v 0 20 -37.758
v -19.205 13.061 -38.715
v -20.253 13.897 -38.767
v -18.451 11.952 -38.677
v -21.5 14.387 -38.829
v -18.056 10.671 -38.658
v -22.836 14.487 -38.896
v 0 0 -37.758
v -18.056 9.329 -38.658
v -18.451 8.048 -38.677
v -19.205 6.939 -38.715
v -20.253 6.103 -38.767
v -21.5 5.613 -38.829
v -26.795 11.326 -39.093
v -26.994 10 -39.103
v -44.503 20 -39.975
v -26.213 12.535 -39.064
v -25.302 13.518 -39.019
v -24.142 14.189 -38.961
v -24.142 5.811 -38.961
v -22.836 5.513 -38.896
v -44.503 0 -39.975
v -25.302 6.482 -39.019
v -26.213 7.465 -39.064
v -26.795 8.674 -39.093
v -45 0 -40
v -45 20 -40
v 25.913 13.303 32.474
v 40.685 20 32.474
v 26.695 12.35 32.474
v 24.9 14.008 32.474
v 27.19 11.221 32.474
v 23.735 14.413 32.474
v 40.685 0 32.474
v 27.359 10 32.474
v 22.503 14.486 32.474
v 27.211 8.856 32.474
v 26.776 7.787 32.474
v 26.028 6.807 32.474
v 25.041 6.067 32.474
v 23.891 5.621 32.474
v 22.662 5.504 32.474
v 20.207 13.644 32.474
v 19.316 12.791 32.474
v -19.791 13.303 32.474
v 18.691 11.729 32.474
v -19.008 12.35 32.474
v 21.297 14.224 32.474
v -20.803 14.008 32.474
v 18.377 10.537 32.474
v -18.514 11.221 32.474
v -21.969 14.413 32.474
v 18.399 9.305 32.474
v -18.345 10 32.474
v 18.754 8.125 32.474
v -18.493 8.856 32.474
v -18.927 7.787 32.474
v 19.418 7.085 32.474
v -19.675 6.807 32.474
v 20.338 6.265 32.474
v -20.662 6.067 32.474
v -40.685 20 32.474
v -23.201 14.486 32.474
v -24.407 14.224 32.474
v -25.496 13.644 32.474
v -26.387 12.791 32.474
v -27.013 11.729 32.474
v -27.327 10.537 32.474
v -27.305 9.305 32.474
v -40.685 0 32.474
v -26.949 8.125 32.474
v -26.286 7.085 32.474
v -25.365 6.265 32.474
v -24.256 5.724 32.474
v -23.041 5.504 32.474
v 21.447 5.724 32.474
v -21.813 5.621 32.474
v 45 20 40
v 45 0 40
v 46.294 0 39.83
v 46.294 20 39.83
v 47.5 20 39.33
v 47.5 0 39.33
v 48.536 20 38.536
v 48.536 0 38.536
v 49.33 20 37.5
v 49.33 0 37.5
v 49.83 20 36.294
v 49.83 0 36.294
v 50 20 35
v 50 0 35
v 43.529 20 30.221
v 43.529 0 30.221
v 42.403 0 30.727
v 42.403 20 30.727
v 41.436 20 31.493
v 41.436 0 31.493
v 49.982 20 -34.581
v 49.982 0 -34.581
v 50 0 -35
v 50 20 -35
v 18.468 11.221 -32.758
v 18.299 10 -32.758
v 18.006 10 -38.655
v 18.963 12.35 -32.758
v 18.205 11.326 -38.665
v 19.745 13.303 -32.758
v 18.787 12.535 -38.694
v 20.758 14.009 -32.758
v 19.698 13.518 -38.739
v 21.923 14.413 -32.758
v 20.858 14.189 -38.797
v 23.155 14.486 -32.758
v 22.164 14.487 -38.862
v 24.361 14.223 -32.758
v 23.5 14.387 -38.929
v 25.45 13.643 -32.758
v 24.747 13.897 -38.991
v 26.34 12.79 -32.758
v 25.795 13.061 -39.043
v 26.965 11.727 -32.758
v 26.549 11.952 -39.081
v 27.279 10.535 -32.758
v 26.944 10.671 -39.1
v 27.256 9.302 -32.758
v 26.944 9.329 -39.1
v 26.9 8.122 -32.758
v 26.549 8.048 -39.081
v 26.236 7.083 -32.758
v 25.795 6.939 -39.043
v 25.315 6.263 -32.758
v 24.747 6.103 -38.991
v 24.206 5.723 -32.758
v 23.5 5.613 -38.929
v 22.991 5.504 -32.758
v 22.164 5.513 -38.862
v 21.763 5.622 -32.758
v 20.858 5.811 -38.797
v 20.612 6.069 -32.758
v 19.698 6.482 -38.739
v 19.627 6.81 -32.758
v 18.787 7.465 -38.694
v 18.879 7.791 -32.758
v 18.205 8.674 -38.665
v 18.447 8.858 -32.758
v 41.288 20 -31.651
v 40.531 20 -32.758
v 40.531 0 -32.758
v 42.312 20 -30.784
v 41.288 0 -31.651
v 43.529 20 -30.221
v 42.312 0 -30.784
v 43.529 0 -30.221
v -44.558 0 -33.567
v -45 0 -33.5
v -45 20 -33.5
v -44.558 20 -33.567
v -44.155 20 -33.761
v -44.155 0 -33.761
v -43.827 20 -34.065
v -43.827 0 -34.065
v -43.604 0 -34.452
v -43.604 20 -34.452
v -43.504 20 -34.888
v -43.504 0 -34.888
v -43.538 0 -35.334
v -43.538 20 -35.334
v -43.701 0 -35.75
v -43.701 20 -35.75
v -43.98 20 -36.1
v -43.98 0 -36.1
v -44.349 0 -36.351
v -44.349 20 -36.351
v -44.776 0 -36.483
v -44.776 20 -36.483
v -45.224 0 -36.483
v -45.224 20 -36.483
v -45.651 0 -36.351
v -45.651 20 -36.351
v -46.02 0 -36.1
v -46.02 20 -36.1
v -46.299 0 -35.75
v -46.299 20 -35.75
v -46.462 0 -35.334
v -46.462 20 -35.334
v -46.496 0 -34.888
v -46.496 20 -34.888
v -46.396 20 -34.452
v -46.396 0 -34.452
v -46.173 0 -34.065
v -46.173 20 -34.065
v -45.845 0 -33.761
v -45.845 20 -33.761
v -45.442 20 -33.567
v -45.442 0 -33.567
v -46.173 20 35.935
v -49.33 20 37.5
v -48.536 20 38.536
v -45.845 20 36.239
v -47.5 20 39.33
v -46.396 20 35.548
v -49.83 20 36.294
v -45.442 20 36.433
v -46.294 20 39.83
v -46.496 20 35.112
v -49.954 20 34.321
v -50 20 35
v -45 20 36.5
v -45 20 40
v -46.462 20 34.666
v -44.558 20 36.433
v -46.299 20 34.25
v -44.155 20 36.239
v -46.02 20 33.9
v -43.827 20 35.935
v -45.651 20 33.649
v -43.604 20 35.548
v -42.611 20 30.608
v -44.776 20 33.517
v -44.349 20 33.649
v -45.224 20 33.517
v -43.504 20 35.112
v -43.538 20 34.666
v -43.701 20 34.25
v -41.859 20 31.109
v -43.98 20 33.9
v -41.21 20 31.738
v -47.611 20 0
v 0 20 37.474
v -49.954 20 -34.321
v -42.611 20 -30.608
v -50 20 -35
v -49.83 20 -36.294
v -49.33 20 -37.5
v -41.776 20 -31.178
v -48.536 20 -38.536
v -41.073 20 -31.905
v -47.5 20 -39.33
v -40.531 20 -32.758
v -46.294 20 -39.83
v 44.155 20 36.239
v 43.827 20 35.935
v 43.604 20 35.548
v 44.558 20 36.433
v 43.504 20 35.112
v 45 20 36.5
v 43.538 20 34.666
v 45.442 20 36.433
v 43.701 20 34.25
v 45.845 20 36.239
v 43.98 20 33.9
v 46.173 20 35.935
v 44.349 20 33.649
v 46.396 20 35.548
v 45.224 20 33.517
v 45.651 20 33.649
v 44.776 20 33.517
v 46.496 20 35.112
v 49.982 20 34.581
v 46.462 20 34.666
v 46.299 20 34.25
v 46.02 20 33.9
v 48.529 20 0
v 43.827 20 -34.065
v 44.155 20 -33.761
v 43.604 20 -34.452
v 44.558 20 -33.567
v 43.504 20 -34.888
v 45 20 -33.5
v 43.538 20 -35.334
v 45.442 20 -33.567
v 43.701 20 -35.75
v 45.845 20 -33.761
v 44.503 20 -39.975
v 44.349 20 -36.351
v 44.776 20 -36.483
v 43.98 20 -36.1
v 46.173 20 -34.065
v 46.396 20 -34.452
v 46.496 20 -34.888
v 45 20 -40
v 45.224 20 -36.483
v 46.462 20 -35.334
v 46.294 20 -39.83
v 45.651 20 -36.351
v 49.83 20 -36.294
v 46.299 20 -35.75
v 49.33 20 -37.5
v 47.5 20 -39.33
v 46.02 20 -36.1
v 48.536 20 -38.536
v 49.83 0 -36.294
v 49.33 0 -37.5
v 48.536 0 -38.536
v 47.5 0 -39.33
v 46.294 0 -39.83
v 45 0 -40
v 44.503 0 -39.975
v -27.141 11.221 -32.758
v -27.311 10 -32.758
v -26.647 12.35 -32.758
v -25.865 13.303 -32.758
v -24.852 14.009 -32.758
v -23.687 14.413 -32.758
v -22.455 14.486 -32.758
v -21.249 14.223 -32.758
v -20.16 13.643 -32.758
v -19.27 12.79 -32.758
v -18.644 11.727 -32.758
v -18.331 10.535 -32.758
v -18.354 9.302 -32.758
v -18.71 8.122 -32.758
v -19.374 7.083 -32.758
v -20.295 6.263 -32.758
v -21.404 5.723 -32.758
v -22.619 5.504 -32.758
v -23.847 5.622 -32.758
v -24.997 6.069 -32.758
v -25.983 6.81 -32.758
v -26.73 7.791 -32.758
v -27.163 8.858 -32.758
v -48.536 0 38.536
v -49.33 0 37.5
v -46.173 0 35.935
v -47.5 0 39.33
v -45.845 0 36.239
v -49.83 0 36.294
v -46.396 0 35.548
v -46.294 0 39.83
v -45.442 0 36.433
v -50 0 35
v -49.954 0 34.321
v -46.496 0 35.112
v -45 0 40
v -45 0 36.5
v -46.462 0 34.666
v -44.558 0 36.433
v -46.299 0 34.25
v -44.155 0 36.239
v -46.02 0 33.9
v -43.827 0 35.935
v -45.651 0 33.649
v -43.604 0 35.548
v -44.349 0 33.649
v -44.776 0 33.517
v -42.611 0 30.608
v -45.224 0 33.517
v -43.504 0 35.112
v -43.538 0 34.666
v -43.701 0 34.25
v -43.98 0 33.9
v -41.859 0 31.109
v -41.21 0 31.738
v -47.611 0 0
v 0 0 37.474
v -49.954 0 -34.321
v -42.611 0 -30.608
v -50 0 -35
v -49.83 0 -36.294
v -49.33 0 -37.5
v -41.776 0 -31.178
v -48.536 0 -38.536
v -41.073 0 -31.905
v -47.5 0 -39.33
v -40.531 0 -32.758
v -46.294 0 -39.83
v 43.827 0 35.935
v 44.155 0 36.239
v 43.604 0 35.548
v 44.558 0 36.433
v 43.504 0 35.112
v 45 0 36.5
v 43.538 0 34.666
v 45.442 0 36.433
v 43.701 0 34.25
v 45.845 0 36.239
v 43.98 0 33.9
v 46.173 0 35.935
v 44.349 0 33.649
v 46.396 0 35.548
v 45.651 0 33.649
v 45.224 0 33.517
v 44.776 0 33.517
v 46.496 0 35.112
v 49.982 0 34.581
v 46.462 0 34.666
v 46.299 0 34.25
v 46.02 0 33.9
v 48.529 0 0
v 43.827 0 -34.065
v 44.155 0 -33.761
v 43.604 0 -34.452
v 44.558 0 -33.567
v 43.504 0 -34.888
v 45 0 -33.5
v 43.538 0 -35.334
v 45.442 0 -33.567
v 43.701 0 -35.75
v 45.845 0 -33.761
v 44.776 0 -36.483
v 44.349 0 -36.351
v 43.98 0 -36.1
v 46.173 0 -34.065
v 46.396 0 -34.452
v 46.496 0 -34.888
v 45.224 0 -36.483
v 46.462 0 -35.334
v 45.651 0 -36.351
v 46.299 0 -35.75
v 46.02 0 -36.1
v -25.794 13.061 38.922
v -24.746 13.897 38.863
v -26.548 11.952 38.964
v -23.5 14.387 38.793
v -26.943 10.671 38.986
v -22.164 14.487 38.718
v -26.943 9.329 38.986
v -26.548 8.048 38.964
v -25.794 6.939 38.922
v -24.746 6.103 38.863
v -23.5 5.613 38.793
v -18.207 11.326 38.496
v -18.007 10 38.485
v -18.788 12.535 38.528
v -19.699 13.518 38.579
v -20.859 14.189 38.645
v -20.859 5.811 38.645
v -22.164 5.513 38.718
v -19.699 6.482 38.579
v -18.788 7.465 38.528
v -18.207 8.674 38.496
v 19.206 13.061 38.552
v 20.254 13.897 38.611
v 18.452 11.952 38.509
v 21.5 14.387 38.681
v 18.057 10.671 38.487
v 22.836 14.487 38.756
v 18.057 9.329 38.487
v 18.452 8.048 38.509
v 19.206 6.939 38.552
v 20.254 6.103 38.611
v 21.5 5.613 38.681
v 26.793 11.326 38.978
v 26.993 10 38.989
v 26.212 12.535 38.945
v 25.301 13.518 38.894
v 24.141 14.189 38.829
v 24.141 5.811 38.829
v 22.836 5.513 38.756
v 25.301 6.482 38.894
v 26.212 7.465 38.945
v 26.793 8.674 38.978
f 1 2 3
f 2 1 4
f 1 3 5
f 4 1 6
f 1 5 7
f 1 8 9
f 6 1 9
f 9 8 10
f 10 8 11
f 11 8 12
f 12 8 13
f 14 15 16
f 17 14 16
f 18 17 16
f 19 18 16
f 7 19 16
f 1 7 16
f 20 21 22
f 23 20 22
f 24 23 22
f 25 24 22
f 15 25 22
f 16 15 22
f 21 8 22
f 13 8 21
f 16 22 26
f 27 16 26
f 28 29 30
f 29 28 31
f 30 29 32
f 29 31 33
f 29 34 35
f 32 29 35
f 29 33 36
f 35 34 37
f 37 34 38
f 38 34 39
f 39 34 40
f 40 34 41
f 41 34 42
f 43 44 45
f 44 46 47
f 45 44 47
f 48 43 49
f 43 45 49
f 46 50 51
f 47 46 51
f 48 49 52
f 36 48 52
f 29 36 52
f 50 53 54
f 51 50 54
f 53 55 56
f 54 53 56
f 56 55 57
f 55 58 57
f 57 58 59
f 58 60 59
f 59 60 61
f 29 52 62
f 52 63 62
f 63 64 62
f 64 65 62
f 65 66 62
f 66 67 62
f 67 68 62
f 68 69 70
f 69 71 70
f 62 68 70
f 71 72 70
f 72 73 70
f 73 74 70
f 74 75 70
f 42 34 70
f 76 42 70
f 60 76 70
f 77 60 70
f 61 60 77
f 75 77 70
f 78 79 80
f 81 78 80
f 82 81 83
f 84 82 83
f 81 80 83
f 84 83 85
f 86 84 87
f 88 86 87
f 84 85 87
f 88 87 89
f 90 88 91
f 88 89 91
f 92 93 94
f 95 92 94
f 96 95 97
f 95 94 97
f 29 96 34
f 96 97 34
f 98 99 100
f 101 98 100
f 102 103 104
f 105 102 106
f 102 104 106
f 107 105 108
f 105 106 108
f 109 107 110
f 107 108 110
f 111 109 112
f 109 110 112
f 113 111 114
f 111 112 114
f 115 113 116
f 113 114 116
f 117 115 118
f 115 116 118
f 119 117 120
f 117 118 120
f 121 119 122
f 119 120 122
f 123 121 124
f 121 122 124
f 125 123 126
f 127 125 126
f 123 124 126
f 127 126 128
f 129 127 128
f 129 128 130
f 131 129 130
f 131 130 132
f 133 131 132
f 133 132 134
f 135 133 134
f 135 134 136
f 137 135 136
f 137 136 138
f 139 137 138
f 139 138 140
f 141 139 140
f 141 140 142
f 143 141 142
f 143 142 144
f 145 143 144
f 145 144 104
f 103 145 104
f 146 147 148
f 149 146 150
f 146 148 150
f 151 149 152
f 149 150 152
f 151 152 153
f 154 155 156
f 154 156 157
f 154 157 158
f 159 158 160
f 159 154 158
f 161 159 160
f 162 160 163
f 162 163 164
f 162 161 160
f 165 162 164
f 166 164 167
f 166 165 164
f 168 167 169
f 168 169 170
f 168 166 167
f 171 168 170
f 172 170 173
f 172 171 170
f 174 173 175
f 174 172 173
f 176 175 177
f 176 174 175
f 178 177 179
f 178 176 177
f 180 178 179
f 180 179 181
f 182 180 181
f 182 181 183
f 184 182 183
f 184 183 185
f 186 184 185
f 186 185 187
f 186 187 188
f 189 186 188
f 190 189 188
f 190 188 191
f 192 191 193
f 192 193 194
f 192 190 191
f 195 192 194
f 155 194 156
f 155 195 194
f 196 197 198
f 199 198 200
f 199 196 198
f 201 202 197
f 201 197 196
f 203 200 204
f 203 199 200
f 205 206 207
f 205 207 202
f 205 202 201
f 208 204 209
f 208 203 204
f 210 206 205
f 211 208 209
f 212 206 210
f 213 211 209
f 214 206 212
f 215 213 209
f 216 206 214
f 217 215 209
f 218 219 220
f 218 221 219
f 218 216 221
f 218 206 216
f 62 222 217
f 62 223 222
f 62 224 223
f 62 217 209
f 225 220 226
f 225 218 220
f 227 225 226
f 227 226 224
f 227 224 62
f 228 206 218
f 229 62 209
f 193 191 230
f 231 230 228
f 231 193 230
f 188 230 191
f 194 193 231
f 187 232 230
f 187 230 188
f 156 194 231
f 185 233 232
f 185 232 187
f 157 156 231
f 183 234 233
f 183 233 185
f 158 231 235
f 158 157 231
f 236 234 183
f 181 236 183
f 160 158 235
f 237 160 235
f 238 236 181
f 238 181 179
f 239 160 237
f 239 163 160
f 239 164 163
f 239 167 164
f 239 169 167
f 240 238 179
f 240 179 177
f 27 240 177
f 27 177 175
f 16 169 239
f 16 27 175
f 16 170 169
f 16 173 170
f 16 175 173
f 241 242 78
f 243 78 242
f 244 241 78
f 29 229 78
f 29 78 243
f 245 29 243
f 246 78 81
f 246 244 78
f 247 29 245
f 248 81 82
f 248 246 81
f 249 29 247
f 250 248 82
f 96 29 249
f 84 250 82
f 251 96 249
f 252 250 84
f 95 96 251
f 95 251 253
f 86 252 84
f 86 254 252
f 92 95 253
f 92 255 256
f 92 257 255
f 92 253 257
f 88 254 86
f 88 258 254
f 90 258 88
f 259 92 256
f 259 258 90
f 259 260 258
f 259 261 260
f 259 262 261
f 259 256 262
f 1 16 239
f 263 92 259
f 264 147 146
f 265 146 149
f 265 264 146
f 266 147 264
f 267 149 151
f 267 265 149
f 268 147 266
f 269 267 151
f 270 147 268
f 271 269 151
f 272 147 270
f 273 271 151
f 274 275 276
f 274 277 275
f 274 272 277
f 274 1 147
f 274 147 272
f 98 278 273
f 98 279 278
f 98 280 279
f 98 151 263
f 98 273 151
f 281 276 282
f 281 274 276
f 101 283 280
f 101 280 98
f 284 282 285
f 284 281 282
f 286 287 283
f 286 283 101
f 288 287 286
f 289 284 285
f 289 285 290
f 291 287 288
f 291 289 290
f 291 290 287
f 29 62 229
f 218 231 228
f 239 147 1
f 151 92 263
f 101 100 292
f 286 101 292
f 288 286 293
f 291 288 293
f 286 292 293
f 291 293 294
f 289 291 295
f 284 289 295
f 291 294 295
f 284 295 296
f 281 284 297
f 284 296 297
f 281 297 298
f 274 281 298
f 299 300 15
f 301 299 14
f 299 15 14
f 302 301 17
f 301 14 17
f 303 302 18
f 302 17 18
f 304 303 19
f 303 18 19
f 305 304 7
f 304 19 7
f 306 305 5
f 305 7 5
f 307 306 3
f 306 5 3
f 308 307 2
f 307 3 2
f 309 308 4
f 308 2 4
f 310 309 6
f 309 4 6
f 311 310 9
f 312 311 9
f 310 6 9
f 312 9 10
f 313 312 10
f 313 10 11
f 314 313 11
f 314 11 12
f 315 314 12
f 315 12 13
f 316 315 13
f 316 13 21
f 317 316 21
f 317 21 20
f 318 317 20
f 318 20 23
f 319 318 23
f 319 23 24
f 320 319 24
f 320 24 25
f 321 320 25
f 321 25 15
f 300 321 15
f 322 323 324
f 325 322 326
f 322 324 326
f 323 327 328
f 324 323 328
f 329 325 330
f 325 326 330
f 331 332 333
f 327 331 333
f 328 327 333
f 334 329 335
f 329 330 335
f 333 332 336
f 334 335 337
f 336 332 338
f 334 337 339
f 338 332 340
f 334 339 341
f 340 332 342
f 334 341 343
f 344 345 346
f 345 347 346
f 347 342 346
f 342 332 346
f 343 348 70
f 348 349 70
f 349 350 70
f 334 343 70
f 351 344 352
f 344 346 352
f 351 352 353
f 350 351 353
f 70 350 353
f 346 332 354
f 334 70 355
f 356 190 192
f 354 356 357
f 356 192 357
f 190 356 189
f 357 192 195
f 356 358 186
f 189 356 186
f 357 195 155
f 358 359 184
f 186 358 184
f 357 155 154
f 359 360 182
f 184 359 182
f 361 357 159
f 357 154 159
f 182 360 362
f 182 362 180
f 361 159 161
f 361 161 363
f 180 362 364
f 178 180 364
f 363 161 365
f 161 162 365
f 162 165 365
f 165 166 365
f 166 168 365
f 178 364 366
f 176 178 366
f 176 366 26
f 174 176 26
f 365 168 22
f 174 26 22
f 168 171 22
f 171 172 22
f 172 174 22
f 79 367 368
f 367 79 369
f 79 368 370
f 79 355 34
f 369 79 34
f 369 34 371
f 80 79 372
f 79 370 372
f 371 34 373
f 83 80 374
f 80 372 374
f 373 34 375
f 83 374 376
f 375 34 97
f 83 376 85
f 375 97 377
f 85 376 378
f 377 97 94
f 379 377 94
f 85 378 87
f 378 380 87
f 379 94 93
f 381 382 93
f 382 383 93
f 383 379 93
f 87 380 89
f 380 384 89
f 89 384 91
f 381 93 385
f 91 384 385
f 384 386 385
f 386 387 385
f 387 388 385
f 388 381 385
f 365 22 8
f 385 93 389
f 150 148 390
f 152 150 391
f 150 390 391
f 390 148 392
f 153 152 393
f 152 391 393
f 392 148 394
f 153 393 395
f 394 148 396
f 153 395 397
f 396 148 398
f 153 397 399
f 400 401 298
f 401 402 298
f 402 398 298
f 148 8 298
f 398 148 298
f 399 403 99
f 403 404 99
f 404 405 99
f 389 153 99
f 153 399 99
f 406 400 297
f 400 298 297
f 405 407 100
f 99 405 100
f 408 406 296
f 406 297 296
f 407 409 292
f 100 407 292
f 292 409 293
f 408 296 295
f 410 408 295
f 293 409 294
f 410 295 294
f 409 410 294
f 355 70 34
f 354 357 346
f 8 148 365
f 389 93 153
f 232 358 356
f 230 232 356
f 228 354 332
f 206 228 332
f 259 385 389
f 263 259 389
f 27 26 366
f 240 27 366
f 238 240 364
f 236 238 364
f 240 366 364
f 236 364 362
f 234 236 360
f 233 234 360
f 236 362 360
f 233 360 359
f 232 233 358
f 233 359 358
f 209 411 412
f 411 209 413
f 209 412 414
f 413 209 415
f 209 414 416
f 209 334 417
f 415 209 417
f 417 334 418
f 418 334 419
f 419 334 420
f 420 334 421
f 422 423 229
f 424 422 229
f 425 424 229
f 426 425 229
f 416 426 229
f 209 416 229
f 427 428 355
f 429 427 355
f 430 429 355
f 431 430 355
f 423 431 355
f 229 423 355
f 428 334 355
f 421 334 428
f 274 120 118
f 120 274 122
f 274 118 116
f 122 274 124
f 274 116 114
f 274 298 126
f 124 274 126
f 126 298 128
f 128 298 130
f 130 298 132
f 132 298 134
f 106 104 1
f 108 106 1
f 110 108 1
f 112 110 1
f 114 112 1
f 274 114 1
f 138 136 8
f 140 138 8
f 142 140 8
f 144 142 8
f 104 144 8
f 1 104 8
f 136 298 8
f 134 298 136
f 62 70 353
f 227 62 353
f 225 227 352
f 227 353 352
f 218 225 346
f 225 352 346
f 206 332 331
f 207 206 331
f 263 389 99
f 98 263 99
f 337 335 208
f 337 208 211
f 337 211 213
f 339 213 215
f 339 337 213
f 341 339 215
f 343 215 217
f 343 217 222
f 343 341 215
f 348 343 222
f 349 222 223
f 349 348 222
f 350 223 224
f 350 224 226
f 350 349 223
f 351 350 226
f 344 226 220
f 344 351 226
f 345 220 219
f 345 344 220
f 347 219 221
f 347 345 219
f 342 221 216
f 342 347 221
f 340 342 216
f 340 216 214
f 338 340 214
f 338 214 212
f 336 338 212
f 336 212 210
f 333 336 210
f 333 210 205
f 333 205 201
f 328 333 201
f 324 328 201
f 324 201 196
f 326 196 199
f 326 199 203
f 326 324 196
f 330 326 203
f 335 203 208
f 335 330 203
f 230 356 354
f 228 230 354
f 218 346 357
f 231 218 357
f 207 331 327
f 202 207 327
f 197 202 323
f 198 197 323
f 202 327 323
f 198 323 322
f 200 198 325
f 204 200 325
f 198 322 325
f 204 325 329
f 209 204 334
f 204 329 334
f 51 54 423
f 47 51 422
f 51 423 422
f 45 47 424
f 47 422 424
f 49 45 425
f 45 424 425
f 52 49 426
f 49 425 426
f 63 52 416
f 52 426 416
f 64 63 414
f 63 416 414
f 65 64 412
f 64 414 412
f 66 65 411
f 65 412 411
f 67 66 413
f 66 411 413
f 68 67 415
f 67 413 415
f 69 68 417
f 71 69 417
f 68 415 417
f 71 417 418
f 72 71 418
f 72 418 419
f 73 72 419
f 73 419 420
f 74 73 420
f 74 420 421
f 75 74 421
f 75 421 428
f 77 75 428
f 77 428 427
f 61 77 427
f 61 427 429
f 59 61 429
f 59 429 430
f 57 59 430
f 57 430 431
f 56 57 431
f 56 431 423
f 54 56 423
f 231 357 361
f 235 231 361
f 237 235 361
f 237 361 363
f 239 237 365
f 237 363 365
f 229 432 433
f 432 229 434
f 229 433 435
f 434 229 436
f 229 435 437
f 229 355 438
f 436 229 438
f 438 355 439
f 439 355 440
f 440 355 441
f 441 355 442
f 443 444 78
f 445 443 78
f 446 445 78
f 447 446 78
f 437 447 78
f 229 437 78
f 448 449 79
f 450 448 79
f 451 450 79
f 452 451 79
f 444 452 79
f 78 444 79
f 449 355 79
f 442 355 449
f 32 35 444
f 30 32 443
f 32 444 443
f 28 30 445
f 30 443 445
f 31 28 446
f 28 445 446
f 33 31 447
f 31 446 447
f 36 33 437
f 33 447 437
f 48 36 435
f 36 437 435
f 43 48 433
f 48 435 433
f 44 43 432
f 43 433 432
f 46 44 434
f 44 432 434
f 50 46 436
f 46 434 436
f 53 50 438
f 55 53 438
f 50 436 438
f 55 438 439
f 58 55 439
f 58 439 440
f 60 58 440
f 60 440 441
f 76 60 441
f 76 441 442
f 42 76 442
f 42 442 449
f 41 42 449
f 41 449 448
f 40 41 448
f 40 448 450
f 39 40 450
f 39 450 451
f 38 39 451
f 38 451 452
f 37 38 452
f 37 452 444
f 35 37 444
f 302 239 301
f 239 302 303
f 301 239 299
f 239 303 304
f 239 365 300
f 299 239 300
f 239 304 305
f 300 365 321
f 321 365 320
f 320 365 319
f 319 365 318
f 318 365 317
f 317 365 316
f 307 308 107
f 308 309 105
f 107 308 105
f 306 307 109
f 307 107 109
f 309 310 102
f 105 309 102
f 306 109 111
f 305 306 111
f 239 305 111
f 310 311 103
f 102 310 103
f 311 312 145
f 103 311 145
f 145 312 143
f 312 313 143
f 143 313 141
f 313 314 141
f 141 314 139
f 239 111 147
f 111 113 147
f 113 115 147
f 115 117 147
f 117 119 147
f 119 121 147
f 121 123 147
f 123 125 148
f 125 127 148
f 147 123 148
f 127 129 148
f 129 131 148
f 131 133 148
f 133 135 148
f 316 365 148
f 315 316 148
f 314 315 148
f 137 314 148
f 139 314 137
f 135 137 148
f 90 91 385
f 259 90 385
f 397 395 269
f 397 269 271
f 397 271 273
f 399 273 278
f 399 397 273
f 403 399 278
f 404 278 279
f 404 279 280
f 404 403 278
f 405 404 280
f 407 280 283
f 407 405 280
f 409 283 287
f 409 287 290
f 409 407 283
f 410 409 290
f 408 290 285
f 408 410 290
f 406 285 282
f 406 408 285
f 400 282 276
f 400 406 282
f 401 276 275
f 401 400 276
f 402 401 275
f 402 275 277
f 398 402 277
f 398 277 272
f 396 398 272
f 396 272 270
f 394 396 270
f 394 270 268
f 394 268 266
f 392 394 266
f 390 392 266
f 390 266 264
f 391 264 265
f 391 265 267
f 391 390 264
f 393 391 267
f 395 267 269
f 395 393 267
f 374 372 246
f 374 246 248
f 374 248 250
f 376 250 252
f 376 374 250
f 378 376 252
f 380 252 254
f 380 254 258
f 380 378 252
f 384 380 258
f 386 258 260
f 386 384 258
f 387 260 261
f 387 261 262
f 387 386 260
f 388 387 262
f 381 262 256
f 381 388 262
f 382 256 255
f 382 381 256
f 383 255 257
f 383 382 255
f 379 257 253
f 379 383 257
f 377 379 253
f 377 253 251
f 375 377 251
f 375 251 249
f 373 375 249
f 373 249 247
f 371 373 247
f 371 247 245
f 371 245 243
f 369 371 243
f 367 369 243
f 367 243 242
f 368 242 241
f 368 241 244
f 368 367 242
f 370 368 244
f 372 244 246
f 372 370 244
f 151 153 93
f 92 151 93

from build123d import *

# Parameters (mm, degrees)
SKETCH1_R                   = 1.5
BOSS_EXTRUDE3_DEPTH         = 20
M10X1_0_TAPPED_HOLE2_REACH  = 97.384
M10X1_0_TAPPED_HOLE2_BORE_R = 4.5
M10X1_0_TAPPED_HOLE3_REACH  = 97.384
M10X1_0_TAPPED_HOLE3_BORE_R = 4.5
M10X1_0_TAPPED_HOLE4_REACH  = 97.514
M10X1_0_TAPPED_HOLE4_BORE_R = 4.5
M10X1_0_TAPPED_HOLE5_REACH  = 97.514
M10X1_0_TAPPED_HOLE5_BORE_R = 4.5


with BuildPart() as part:
    # Sketch1 → Boss-Extrude3 (new body)
    with BuildSketch(Plane(origin=(0, 0, 0), x_dir=(1, 0, 0), z_dir=(0, 1, 0))):
        with BuildLine():
            Line((-44.503051854, 39.975242963), (-45, 40))
            ThreePointArc((-45, 40), (-48.535533906, 38.535533906), (-50, 35))
            Line((-50, 35), (-49.953621428, 34.32056292))
            Line((-49.953621428, 34.32056292), (-47.610889869, 0))
            Line((-47.610889869, 0), (-49.953621428, -34.32056292))
            Line((-49.953621428, -34.32056292), (-50, -35))
            ThreePointArc((-50, -35), (-48.535533906, -38.535533906), (-45, -40))
            Line((-45, -40), (0, -37.473505635))
            Line((0, -37.473505635), (45, -40))
            ThreePointArc((45, -40), (48.535533906, -38.535533906), (50, -35))
            Line((50, -35), (49.982372149, -34.580514872))
            Line((49.982372149, -34.580514872), (48.529209365, 0))
            Line((48.529209365, 0), (49.982372149, 34.580514872))
            Line((49.982372149, 34.580514872), (50, 35))
            ThreePointArc((50, 35), (48.535533906, 38.535533906), (45, 40))
            Line((45, 40), (44.503051854, 39.975242963))
            Line((44.503051854, 39.975242963), (0, 37.758183271))
            Line((0, 37.758183271), (-44.503051854, 39.975242963))
        make_face()
        with Locations(Location((-45, -35, 0), (0, 0, 270))):
            Circle(SKETCH1_R, mode=Mode.SUBTRACT)
        with Locations(Location((45, -35, 0), (0, 0, 270))):
            Circle(SKETCH1_R, mode=Mode.SUBTRACT)
        with Locations(Location((-45, 35, 0), (0, 0, 270))):
            Circle(SKETCH1_R, mode=Mode.SUBTRACT)
        with BuildLine():
            Line((40.685277967, -32.473505635), (-40.685277967, -32.473505635))
            ThreePointArc((-40.685277967, -32.473505635), (-41.520684905, -31.409127338), (-42.610889869, -30.607716678))
            Line((-42.610889869, -30.607716678), (-42.610889869, 30.607716678))
            ThreePointArc((-42.610889869, 30.607716678), (-41.406196107, 31.523712673), (-40.530743043, 32.758183271))
            Line((-40.530743043, 32.758183271), (40.530743043, 32.758183271))
            ThreePointArc((40.530743043, 32.758183271), (41.770434724, 31.182945097), (43.529209365, 30.221216169))
            Line((43.529209365, 30.221216169), (43.529209365, -30.221216169))
            ThreePointArc((43.529209365, -30.221216169), (41.895770439, -31.080336898), (40.685277967, -32.473505635))
        make_face(mode=Mode.SUBTRACT)
        with Locations(Location((45, 35, 0), (0, 0, 270))):
            Circle(SKETCH1_R, mode=Mode.SUBTRACT)
    extrude(amount=BOSS_EXTRUDE3_DEPTH)

    # M10x1.0 Tapped Hole2 bore → M10x1.0 Tapped Hole2 (cut, up to next)
    with BuildSketch(Plane(origin=(2.097313344, 0, 37.355753405), x_dir=(0.9984276240489233, 0, -0.05605603924665131), z_dir=(0.05605603924665131, 0, 0.9984276240489233)), mode=Mode.PRIVATE) as m10x1_0_tapped_hole2_sk1:
        with Locations((-24.636050477, 10)):
            Circle(M10X1_0_TAPPED_HOLE2_BORE_R)
    m10x1_0_tapped_hole2_tool1 = extrude(m10x1_0_tapped_hole2_sk1.sketch, amount=-M10X1_0_TAPPED_HOLE2_REACH, mode=Mode.PRIVATE) & part.part
    add(m10x1_0_tapped_hole2_tool1.solids().sort_by_distance((-22.5, 10, 38.736753))[0], mode=Mode.SUBTRACT)

    # M10x1.0 Tapped Hole3 bore → M10x1.0 Tapped Hole3 (cut, up to next)
    with BuildSketch(Plane(origin=(-2.097313344, 0, 37.355753405), x_dir=(0.9984276240489233, 0, 0.056056039246651354), z_dir=(-0.056056039246651354, 0, 0.9984276240489233)), mode=Mode.PRIVATE) as m10x1_0_tapped_hole3_sk1:
        with Locations((24.636050477, 10)):
            Circle(M10X1_0_TAPPED_HOLE3_BORE_R)
    m10x1_0_tapped_hole3_tool1 = extrude(m10x1_0_tapped_hole3_sk1.sketch, amount=-M10X1_0_TAPPED_HOLE3_REACH, mode=Mode.PRIVATE) & part.part
    add(m10x1_0_tapped_hole3_tool1.solids().sort_by_distance((22.5, 10, 38.736753))[0], mode=Mode.SUBTRACT)

    # M10x1.0 Tapped Hole4 bore → M10x1.0 Tapped Hole4 (cut, up to next)
    with BuildSketch(Plane(origin=(-1.876385916, 0, -37.664705196), x_dir=(-0.9987613810598752, 0, 0.049756443837666), z_dir=(-0.049756443837666, 0, -0.9987613810598752)), mode=Mode.PRIVATE) as m10x1_0_tapped_hole4_sk1:
        with Locations((-24.406616413, 10)):
            Circle(M10X1_0_TAPPED_HOLE4_BORE_R)
    m10x1_0_tapped_hole4_tool1 = extrude(m10x1_0_tapped_hole4_sk1.sketch, amount=-M10X1_0_TAPPED_HOLE4_REACH, mode=Mode.PRIVATE) & part.part
    add(m10x1_0_tapped_hole4_tool1.solids().sort_by_distance((22.5, 10, -38.879092))[0], mode=Mode.SUBTRACT)

    # M10x1.0 Tapped Hole5 bore → M10x1.0 Tapped Hole5 (cut, up to next)
    with BuildSketch(Plane(origin=(1.876385916, 0, -37.664705196), x_dir=(-0.9987613810598767, 0, -0.04975644383763697), z_dir=(0.049756443837636964, 0, -0.9987613810598766)), mode=Mode.PRIVATE) as m10x1_0_tapped_hole5_sk1:
        with Locations((24.406616413, 10)):
            Circle(M10X1_0_TAPPED_HOLE5_BORE_R)
    m10x1_0_tapped_hole5_tool1 = extrude(m10x1_0_tapped_hole5_sk1.sketch, amount=-M10X1_0_TAPPED_HOLE5_REACH, mode=Mode.PRIVATE) & part.part
    add(m10x1_0_tapped_hole5_tool1.solids().sort_by_distance((-22.5, 10, -38.879092))[0], mode=Mode.SUBTRACT)


solid = part.part
